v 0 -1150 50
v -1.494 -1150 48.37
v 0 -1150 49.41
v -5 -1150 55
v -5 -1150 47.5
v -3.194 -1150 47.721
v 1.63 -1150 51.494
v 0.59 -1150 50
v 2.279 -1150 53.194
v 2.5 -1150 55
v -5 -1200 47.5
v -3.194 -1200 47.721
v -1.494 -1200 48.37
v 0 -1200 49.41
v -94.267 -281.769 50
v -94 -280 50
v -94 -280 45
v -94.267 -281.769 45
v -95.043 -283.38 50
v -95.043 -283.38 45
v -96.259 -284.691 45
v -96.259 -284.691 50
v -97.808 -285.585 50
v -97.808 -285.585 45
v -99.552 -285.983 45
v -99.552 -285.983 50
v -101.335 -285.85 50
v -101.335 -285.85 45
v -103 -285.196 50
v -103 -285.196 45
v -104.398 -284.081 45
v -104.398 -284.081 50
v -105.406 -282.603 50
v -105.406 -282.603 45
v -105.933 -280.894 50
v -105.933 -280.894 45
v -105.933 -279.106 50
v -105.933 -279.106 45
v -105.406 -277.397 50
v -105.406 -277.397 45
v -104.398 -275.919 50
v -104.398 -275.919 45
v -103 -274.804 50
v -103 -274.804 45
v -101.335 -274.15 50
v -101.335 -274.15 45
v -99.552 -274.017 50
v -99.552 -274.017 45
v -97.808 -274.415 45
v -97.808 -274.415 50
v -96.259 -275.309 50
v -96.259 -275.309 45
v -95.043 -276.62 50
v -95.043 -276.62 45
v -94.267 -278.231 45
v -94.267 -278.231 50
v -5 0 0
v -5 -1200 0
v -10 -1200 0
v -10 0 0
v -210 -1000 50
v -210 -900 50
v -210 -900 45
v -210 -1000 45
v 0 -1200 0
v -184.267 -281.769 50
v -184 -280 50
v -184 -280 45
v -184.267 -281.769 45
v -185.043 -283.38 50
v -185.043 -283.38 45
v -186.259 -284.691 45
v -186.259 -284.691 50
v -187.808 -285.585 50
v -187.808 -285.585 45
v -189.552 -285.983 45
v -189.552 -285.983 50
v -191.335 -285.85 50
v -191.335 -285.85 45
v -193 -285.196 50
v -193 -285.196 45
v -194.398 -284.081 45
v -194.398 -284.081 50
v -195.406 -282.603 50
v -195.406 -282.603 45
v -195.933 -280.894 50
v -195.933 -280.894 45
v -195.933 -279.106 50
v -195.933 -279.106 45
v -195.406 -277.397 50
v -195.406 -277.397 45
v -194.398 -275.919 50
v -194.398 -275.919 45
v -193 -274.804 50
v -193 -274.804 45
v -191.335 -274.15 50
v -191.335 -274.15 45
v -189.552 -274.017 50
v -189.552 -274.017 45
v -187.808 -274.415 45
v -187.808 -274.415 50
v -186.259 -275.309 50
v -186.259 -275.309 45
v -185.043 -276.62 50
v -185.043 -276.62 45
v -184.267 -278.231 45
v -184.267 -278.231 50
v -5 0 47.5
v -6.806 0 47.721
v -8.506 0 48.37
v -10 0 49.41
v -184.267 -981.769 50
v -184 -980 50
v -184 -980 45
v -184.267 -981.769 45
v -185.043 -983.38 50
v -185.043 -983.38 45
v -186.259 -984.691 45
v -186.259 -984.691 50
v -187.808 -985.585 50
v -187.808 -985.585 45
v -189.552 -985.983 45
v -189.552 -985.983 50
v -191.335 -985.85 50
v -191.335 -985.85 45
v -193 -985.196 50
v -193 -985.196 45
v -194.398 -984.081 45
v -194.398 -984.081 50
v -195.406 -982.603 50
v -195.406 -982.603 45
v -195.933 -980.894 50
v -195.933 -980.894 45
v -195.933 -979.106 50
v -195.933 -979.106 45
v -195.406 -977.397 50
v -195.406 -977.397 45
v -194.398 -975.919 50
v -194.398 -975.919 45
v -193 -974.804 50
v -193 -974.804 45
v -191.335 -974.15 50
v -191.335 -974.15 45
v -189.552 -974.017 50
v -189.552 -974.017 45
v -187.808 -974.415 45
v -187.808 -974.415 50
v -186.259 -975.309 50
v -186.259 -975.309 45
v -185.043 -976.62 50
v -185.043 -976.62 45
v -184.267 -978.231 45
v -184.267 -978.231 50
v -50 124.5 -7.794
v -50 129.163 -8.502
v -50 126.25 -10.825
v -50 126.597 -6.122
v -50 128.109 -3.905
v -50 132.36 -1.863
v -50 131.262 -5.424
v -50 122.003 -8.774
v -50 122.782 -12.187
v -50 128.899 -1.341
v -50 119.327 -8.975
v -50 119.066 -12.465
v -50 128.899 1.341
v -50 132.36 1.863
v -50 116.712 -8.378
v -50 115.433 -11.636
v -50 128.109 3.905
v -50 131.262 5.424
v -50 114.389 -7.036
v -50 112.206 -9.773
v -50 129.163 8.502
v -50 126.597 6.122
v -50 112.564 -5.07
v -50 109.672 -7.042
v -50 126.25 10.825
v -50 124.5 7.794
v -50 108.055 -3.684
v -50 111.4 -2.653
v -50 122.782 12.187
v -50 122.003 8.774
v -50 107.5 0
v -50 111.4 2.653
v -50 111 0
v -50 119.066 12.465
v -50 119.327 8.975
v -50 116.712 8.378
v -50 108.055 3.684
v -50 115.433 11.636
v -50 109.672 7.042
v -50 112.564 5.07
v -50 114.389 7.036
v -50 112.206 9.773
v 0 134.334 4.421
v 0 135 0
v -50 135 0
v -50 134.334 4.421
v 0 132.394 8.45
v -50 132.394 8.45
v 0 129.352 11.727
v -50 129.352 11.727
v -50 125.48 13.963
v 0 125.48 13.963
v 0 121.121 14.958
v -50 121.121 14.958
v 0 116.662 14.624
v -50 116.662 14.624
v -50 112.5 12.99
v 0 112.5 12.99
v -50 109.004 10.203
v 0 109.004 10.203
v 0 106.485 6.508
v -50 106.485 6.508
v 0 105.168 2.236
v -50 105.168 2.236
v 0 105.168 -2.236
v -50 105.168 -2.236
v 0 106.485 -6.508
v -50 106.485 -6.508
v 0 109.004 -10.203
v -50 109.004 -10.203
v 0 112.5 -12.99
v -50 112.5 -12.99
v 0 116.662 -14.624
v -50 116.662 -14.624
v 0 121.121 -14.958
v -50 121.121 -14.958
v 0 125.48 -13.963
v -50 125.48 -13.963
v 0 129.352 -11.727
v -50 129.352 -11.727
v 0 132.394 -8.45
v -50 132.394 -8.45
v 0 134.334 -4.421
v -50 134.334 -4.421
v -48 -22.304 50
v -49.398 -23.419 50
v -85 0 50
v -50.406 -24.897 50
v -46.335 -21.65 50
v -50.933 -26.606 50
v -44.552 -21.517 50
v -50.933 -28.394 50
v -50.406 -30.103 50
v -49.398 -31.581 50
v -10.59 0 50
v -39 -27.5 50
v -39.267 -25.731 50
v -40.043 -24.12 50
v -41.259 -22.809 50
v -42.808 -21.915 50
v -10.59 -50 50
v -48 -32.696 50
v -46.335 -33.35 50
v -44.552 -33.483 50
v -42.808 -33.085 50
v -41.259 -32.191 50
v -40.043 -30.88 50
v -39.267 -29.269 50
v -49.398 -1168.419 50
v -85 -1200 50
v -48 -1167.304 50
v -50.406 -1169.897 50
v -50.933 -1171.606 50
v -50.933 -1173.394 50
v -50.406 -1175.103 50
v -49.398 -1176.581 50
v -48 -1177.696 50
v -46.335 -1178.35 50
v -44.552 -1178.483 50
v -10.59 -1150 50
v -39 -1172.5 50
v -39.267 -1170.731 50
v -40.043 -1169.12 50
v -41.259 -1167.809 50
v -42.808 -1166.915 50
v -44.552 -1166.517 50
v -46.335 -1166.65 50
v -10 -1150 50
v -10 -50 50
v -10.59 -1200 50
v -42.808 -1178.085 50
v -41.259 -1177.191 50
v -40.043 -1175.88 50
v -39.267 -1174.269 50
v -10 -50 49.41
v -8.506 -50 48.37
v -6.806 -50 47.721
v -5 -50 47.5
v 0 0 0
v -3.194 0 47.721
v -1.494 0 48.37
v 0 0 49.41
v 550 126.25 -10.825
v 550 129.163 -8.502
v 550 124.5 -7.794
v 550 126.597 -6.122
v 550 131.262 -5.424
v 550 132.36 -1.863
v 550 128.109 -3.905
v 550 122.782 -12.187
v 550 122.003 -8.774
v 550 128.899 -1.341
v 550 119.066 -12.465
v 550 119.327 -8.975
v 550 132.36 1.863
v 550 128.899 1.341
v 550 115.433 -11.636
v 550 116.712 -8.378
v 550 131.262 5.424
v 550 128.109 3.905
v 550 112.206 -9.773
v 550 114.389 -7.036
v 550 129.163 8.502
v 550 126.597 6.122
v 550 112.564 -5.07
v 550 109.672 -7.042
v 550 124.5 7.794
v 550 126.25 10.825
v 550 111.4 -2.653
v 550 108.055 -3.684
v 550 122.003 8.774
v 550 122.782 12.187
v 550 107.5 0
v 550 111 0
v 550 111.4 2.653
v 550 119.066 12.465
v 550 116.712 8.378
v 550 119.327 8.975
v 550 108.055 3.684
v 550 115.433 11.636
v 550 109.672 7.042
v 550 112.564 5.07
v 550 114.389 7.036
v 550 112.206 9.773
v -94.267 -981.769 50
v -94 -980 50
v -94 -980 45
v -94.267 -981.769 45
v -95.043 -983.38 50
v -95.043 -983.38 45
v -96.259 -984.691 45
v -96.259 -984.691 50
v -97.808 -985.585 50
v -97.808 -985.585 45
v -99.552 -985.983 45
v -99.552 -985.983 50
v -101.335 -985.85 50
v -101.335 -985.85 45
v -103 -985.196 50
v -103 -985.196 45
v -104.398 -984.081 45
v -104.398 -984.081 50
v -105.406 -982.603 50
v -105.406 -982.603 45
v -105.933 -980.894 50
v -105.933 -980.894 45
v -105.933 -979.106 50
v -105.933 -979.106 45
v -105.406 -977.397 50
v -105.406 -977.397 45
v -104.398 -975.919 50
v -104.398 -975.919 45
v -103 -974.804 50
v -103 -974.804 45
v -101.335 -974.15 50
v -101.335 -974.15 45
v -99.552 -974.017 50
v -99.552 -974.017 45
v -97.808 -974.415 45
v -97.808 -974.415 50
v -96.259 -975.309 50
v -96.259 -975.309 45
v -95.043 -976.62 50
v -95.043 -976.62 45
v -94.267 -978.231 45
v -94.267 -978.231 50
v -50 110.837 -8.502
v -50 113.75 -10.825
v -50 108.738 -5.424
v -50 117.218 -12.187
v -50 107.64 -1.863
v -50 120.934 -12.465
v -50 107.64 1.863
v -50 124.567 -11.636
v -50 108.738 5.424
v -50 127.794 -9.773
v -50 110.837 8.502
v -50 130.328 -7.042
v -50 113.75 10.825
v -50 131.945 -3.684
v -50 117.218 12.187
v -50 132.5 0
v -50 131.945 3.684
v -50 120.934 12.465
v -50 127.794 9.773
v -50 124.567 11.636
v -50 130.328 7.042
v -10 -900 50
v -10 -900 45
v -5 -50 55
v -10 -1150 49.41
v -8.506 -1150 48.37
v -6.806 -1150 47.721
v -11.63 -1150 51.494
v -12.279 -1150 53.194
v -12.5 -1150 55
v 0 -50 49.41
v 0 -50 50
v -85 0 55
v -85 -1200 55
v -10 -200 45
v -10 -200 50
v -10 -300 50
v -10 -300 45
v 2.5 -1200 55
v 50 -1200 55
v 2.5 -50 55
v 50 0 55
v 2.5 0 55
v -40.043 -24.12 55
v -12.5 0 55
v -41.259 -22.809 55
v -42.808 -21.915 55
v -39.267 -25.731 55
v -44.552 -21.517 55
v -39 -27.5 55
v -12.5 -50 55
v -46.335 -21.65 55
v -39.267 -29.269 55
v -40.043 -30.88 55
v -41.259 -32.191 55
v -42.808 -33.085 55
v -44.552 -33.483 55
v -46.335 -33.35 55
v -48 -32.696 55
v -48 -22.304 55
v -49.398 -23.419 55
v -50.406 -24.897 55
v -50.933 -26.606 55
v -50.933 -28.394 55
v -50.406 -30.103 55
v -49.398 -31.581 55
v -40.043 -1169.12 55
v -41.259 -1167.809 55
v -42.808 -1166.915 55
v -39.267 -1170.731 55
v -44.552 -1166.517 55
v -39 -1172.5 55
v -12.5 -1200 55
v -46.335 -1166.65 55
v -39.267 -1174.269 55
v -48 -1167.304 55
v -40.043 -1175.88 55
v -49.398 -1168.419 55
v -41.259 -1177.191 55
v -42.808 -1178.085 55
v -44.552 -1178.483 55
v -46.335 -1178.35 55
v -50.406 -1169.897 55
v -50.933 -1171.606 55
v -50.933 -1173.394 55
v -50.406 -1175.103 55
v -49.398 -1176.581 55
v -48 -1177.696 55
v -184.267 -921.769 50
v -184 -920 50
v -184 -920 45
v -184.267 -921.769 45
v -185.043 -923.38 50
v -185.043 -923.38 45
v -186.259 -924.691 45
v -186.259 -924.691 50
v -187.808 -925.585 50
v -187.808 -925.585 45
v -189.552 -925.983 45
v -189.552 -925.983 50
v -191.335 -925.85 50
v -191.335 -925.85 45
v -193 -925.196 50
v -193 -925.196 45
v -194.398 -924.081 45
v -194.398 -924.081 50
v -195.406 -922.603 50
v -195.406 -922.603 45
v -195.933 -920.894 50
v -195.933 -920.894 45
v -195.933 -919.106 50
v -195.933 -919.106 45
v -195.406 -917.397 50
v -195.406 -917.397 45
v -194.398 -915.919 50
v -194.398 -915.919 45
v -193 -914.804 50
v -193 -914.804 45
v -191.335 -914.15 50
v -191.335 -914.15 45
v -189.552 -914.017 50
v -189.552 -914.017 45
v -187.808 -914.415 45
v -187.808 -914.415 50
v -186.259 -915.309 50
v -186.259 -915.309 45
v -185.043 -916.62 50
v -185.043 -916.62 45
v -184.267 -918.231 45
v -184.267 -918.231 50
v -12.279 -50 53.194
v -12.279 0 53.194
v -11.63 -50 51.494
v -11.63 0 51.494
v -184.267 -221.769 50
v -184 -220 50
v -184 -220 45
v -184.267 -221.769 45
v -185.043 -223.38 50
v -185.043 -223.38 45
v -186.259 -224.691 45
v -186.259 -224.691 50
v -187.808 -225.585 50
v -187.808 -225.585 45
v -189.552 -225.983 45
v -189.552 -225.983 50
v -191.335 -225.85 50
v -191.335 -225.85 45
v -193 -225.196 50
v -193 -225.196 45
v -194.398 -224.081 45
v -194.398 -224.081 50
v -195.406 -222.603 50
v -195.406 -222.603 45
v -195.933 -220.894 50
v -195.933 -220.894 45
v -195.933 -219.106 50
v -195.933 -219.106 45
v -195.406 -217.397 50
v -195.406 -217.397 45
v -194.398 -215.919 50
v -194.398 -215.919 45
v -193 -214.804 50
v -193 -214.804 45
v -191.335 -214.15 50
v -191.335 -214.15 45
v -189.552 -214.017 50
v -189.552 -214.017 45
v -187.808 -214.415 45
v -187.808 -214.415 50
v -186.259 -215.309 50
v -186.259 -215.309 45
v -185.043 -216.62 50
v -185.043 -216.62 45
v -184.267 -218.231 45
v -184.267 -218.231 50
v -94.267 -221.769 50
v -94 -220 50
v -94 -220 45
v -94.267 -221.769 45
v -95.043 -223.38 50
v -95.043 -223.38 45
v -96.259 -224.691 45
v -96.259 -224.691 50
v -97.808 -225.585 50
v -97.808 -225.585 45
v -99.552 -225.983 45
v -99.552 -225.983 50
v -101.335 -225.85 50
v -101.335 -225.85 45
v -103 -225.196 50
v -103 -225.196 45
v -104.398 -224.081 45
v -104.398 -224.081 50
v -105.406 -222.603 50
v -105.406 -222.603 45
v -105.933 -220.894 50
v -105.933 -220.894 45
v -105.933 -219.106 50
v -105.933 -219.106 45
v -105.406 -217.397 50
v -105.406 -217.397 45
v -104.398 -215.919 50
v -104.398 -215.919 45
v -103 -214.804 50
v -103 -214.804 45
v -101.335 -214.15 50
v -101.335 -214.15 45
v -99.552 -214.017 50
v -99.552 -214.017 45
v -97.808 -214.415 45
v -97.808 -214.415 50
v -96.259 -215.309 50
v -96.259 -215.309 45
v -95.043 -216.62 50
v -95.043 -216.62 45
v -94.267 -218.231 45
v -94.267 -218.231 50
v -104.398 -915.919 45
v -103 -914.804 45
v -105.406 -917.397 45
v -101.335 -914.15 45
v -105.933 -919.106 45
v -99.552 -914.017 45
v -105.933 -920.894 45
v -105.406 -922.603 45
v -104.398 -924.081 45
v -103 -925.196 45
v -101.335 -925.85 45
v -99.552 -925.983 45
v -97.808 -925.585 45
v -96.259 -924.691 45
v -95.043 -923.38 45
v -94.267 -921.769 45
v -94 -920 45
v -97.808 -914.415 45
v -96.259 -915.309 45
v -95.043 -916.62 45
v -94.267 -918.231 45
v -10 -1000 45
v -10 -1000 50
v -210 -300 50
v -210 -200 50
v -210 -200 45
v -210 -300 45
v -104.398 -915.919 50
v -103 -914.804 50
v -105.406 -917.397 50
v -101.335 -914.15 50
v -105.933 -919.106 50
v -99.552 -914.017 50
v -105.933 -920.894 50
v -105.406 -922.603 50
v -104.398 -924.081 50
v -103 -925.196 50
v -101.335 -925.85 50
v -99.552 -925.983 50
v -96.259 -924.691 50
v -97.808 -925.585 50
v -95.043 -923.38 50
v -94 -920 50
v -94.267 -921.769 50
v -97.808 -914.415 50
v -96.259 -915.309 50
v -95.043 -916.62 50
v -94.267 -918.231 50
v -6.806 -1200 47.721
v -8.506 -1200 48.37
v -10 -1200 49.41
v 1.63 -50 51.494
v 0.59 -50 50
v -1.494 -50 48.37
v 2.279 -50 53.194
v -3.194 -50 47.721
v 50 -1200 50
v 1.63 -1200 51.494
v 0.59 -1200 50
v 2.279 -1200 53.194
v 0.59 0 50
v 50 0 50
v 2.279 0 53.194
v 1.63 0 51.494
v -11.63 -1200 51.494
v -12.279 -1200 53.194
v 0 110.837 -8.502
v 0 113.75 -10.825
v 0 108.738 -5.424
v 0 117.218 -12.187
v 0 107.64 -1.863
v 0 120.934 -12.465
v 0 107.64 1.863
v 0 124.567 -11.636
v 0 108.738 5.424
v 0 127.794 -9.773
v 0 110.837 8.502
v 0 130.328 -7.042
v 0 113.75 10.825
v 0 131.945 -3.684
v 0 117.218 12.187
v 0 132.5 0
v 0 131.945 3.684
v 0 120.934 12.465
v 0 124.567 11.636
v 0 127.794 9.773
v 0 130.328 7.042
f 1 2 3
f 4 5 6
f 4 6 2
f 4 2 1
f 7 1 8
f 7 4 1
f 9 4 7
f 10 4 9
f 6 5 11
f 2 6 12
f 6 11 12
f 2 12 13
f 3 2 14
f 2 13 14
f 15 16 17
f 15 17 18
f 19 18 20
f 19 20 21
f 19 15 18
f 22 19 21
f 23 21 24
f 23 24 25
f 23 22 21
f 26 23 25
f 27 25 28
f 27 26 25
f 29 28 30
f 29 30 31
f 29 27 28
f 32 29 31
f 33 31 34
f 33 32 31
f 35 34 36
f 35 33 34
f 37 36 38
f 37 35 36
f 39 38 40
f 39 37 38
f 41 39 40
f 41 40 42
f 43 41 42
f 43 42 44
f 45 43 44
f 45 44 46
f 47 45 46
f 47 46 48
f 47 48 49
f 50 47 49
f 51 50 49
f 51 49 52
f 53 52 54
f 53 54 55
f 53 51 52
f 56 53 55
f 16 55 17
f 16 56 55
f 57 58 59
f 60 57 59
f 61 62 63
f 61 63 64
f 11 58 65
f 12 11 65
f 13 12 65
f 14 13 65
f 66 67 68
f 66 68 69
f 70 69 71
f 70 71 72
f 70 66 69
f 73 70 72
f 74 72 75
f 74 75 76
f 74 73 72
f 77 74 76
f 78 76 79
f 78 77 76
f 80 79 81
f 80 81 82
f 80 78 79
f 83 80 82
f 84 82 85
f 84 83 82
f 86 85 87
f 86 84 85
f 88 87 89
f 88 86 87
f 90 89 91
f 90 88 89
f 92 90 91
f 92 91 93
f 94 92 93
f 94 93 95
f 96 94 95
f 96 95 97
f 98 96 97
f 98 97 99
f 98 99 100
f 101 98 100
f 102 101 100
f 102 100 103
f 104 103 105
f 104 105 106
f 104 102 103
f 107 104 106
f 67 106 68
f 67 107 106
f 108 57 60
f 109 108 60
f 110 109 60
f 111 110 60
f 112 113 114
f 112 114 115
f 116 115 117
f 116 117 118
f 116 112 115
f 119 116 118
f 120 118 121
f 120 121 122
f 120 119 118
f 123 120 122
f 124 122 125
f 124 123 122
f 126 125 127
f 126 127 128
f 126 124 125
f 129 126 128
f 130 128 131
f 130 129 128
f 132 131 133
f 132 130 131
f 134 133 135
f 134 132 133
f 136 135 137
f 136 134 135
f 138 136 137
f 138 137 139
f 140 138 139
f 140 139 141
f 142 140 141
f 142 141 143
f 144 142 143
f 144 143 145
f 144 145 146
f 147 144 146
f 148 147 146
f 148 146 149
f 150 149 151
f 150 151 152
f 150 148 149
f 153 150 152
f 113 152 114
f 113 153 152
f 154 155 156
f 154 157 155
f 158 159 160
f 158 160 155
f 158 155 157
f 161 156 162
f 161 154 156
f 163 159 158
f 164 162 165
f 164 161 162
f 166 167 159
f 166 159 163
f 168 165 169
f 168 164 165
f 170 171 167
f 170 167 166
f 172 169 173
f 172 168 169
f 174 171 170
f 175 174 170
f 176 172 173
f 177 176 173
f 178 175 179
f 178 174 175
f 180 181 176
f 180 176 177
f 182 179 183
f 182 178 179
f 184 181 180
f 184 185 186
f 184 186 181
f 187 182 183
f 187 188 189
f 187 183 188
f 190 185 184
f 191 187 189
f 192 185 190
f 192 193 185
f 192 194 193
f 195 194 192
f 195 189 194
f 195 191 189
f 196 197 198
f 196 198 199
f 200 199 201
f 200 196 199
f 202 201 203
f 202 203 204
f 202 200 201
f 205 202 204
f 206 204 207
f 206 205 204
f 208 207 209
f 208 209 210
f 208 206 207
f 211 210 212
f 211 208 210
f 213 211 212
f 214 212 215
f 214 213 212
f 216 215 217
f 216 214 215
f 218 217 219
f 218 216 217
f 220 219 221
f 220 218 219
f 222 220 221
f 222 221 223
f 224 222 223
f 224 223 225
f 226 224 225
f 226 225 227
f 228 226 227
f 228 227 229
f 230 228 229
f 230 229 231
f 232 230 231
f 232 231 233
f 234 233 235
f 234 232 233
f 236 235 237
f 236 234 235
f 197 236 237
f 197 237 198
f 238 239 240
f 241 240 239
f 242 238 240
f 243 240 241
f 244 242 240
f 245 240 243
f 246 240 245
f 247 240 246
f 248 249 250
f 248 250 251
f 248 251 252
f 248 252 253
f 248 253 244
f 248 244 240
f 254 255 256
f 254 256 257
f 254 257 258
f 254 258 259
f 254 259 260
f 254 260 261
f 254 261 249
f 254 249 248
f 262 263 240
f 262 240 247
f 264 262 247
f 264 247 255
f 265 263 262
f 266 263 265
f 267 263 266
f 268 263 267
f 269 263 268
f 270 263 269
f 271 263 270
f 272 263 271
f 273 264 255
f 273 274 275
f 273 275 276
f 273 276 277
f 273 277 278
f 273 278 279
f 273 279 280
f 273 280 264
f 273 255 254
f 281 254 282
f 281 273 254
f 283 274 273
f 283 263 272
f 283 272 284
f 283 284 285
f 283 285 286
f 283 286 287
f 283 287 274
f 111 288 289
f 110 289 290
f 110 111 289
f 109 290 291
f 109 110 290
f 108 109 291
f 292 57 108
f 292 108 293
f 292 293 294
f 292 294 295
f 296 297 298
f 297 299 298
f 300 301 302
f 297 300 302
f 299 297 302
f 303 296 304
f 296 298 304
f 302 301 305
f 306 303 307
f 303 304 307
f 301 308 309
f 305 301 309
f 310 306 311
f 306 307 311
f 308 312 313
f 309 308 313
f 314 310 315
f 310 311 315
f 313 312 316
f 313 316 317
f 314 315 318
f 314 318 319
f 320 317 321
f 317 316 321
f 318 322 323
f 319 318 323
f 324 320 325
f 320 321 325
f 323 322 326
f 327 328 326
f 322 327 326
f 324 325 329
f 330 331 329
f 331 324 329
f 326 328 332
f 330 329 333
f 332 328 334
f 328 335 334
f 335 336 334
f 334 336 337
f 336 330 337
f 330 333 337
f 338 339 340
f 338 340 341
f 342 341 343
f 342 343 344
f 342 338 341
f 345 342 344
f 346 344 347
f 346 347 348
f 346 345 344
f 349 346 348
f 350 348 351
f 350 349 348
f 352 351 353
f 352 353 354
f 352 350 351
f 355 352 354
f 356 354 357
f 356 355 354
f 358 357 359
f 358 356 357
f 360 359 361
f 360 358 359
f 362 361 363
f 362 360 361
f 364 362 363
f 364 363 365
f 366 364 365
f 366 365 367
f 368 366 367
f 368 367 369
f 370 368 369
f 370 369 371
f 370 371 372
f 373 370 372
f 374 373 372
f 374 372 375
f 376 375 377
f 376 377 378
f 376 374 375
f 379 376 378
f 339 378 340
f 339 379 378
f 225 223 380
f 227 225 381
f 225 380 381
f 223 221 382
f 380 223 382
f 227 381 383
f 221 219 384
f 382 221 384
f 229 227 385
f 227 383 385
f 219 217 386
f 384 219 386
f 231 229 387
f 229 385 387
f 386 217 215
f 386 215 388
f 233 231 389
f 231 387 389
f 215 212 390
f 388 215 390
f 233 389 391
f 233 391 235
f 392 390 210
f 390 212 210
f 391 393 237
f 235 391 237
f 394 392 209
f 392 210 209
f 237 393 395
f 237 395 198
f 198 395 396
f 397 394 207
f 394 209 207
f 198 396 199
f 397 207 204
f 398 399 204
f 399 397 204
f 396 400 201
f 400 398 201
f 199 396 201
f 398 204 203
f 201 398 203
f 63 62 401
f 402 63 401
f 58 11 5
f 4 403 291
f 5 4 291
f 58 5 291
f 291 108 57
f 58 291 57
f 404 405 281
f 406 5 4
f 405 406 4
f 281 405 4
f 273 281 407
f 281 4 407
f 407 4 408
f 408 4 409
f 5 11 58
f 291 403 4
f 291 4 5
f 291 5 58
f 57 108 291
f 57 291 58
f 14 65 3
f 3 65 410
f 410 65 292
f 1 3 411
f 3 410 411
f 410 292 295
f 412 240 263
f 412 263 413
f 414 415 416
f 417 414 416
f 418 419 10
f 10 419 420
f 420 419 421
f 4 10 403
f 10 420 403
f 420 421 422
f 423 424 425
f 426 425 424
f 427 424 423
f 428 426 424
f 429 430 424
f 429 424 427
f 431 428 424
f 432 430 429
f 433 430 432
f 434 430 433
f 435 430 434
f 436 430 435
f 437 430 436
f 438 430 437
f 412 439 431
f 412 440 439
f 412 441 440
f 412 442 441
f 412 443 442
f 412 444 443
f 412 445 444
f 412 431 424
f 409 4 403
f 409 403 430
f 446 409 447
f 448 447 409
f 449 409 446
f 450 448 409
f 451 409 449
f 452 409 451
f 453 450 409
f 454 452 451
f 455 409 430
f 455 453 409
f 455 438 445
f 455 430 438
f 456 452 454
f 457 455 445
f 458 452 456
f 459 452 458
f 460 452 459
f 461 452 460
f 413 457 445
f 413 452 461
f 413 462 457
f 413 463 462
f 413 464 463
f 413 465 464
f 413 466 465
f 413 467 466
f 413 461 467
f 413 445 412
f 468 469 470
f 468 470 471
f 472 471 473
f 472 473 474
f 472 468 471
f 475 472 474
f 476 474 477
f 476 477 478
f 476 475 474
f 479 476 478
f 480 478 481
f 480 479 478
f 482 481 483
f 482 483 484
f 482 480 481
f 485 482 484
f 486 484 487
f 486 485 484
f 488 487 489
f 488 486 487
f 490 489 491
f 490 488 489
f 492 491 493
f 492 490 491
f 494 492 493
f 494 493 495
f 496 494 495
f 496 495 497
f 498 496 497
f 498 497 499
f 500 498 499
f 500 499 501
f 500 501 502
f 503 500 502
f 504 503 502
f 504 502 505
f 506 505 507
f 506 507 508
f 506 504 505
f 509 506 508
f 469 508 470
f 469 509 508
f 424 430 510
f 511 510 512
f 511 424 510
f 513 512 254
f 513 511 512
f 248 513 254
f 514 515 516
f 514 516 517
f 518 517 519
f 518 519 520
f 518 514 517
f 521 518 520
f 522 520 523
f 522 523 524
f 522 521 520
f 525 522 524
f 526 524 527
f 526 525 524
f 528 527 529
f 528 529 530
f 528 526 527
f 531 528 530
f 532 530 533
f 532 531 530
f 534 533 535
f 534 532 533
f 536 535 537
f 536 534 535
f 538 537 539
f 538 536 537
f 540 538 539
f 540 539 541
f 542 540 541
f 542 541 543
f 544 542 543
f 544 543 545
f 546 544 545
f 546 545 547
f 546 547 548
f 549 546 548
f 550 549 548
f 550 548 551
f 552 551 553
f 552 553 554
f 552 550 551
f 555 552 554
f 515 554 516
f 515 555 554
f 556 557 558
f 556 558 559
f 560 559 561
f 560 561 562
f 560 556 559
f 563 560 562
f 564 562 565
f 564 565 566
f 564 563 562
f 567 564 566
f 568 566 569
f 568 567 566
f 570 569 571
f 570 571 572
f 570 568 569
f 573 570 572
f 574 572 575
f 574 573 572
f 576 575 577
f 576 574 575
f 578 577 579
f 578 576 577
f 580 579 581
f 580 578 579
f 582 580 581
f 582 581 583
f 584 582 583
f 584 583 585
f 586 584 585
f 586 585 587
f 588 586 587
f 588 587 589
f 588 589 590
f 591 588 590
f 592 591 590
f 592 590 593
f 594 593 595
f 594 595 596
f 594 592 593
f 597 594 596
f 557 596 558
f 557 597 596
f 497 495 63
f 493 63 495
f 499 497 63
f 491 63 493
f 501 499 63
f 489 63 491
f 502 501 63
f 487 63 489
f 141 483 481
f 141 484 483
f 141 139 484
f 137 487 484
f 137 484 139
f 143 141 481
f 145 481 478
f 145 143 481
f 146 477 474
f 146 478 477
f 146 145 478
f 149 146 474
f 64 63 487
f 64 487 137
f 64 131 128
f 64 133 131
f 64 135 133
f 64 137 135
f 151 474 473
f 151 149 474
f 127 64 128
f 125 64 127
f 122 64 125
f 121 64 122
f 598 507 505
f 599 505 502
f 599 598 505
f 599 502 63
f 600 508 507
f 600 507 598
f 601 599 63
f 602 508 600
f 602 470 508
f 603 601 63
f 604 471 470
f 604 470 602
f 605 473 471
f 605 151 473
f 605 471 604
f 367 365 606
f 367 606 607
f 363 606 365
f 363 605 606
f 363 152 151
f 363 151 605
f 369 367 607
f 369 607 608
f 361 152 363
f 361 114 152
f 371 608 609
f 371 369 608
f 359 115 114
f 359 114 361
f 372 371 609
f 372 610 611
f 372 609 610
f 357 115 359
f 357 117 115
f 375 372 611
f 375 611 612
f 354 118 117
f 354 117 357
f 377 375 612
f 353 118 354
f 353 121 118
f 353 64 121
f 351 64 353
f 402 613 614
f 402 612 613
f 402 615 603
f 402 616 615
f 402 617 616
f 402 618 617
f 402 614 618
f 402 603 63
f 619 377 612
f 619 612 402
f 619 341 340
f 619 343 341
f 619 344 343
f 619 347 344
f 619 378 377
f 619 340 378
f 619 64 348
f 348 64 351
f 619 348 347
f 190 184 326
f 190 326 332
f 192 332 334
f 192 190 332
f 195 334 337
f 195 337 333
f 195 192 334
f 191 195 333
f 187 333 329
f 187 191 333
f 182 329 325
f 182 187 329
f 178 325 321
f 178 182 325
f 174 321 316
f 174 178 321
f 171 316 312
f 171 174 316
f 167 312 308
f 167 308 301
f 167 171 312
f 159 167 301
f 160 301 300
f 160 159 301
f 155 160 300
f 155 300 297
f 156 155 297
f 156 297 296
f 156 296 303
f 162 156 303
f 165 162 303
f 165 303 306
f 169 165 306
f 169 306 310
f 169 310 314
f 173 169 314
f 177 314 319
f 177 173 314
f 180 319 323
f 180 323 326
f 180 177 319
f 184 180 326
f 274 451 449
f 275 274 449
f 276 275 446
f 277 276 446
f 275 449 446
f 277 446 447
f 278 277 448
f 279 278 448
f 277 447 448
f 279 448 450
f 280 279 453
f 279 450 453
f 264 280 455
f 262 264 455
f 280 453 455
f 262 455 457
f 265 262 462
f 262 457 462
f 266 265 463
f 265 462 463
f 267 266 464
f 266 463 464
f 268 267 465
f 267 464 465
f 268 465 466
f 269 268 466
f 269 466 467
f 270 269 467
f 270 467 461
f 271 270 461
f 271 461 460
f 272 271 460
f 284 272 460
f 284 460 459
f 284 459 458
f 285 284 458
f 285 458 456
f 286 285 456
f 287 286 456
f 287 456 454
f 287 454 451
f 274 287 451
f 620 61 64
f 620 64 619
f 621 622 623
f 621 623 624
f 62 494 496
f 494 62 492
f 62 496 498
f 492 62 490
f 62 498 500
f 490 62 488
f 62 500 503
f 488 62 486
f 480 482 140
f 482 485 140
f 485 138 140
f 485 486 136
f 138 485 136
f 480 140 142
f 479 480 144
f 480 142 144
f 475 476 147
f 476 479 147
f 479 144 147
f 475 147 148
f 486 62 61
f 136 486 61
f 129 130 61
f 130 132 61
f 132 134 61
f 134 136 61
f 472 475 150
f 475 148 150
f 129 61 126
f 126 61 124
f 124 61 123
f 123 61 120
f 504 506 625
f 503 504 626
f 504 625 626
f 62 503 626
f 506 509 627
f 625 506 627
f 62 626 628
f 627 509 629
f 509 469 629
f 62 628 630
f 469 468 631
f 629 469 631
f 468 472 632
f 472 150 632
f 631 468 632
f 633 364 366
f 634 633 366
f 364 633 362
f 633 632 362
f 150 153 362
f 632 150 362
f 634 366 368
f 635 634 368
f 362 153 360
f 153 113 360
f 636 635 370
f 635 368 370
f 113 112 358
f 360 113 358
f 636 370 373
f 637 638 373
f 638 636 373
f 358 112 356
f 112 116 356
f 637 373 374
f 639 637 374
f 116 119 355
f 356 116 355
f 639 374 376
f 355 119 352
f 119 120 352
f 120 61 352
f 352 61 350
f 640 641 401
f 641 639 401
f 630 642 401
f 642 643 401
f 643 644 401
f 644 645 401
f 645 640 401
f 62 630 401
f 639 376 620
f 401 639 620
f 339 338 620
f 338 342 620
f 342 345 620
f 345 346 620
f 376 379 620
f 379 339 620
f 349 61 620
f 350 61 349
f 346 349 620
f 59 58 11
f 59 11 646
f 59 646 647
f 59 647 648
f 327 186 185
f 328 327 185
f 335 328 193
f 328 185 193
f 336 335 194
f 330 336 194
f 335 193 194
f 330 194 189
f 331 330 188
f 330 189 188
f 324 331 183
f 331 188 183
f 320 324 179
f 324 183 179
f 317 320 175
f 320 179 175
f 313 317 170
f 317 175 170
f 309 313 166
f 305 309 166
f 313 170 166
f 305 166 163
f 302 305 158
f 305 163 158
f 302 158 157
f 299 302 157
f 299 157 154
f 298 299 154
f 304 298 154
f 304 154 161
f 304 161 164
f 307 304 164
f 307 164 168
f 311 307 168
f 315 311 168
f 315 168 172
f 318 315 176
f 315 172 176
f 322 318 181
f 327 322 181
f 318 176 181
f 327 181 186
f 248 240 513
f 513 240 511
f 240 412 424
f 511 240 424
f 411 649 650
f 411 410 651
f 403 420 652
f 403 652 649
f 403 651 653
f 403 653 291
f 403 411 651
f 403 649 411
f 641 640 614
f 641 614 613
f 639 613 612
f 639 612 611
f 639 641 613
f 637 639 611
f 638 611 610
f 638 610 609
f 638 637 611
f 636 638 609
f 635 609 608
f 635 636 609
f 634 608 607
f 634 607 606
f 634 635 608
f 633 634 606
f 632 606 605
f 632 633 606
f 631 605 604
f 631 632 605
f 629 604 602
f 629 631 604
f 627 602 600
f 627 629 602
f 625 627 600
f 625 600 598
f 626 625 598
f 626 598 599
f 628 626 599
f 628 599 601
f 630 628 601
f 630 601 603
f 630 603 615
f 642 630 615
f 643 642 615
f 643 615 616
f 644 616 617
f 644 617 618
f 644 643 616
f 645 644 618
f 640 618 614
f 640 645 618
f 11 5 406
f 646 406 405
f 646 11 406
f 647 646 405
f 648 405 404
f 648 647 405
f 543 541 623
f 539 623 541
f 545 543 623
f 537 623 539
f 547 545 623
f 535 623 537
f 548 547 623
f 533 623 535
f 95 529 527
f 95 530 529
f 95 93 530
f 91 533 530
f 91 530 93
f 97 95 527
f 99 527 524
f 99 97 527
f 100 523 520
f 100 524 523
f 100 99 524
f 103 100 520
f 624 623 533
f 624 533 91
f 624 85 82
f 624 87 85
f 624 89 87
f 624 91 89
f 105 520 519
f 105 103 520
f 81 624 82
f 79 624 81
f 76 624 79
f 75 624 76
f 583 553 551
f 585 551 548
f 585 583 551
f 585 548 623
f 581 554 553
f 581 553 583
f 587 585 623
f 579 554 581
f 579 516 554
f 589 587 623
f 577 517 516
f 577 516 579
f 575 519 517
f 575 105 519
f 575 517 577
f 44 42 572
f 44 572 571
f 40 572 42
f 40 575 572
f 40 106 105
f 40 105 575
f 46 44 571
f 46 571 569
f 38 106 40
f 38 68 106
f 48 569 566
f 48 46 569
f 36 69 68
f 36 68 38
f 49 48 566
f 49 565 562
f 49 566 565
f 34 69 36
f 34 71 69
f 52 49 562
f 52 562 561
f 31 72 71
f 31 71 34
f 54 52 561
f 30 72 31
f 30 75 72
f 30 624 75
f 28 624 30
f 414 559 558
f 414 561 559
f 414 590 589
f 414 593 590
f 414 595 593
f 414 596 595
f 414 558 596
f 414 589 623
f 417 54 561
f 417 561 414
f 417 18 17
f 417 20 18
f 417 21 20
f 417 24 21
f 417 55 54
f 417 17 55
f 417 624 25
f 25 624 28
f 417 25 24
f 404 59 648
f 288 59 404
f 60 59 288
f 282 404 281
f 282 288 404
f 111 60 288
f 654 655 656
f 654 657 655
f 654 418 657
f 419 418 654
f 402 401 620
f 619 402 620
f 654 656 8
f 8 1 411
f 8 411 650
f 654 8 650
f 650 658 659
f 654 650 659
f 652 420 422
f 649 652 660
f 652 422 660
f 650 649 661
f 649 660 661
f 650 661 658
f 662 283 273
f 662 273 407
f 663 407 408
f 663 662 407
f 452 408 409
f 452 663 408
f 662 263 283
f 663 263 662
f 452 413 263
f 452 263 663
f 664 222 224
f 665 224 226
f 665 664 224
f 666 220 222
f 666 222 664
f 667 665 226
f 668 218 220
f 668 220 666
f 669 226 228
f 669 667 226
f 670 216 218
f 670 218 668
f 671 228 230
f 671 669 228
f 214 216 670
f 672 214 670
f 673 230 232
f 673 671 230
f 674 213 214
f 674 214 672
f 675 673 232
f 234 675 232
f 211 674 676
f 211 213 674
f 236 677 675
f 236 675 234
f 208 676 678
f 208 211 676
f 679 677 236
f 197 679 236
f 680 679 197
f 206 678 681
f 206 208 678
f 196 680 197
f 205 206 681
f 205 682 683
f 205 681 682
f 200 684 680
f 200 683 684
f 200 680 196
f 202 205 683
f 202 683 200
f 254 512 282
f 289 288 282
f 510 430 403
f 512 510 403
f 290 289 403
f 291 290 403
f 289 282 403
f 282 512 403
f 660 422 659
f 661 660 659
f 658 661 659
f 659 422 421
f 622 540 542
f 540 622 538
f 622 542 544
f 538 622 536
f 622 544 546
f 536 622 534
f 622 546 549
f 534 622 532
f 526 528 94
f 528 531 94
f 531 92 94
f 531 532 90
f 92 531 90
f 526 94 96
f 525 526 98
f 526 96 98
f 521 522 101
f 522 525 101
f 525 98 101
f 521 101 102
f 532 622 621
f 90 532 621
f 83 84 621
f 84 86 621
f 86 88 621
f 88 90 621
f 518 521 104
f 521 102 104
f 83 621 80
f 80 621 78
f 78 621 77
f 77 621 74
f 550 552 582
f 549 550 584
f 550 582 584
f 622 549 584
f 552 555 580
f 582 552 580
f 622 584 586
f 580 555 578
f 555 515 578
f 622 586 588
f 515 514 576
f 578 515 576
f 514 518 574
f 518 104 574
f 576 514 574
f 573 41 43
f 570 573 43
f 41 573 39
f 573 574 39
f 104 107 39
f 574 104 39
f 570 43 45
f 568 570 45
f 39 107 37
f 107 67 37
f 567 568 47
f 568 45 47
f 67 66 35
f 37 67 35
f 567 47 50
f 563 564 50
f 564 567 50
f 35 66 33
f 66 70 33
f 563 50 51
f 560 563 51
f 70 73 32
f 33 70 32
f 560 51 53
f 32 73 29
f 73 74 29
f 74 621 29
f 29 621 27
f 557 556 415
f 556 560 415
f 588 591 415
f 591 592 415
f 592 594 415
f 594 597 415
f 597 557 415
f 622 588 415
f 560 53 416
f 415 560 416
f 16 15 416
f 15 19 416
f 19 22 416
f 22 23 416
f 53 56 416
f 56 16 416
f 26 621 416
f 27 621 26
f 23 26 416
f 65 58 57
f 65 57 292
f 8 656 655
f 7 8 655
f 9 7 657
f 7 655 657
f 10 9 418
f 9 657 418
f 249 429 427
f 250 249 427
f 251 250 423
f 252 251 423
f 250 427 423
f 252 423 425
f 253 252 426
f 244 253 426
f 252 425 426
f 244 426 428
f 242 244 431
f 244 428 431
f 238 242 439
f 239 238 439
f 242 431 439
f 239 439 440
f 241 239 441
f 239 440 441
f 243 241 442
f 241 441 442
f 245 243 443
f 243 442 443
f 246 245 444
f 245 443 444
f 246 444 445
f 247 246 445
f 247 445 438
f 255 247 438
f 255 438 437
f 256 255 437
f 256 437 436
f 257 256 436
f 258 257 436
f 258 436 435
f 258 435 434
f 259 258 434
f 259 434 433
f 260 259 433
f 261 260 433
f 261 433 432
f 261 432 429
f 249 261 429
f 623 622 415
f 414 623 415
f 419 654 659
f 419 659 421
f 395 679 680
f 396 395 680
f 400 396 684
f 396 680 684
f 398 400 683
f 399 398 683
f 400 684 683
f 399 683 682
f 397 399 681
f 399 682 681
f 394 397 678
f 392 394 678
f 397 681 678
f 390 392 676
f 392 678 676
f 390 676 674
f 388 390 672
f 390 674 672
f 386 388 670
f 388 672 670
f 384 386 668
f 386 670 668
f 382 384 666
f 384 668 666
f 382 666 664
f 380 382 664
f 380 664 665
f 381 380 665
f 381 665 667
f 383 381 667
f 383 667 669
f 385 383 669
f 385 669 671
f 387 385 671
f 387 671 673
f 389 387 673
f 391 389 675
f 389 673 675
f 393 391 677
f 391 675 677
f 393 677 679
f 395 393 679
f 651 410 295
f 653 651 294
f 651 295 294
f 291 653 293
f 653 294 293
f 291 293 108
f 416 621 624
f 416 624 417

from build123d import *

# Parameters (mm, degrees)
F1_DEPTH  = 1200
F2_R      = 7.5
F3_DEPTH  = 50
F4_R      = 7.5
F5_DEPTH  = 50
F8_R      = 6
F9_DEPTH  = 25
F10_W     = 200
F10_H     = 100
F10_R     = 6
F11_DEPTH = 5
F12_R     = 15
F12_R_2   = 12.5
F13_DEPTH = 50
F14_R     = 12.5
F14_R_2   = 9
F15_DEPTH = 600
F16_W     = 25
F16_H     = 5
F16_W_2   = 1
F17_DEPTH = 1200


with BuildPart() as f1:
    # F0 (on Front) → F1 (new body)
    with BuildSketch(Plane.XZ):
        Polygon((-5, 0), (0, 0), (0, 50), (50, 50), (50, 55), (-5, 55), align=None)
    extrude(amount=F1_DEPTH)

    # F2 (on face) → F3 (cut)
    with BuildSketch(Plane(origin=(0, 0, 0), x_dir=(-1, 0, 0), z_dir=(0, 1, 0))):
        with Locations((5, 55)):
            Circle(F2_R)
    extrude(amount=-F3_DEPTH, mode=Mode.SUBTRACT)

    # F4 (on face) → F5 (cut)
    with BuildSketch(Plane.XZ.offset(1200)):
        with Locations((-5, 55)):
            Circle(F4_R)
    extrude(amount=-F5_DEPTH, mode=Mode.SUBTRACT)


with BuildPart() as f7_1:
    # F7: instance of F1
    add(f1.part.mirror(Plane.YZ.offset(-5)))

    # F8 (on face) → F9 (cut)
    with BuildSketch(Plane.XY.offset(55)):
        with Locations((-45, -27.5)):
            Circle(F8_R)
        with Locations((-45, -1172.5)):
            Circle(F8_R)
    extrude(amount=-F9_DEPTH, mode=Mode.SUBTRACT)

    # F16 (on face) → F17 (join)
    with BuildSketch(Plane.XZ.offset(1200)):
        with Locations((-72.5, 52.5)):
            Rectangle(F16_W, F16_H)
        with Locations((-59.5, 52.5)):
            Rectangle(F16_W_2, F16_H)
    extrude(amount=-F17_DEPTH)


with BuildPart() as f11:
    # F10 (on face) → F11 (new body)
    with BuildSketch(Plane(origin=(0, 0, 50), x_dir=(1, 0, 0), z_dir=(0, 0, -1))):
        with Locations((-110, 250)):
            Rectangle(F10_W, F10_H)
        with Locations((-190, 220)):
            Circle(F10_R, mode=Mode.SUBTRACT)
        with Locations((-190, 280)):
            Circle(F10_R, mode=Mode.SUBTRACT)
        with Locations((-100, 220)):
            Circle(F10_R, mode=Mode.SUBTRACT)
        with Locations((-100, 280)):
            Circle(F10_R, mode=Mode.SUBTRACT)
    extrude(amount=F11_DEPTH)


with BuildPart() as f11b:
    # F10 (on face) → F11, piece 2 (new body)
    with BuildSketch(Plane(origin=(0, 0, 50), x_dir=(1, 0, 0), z_dir=(0, 0, -1))):
        with Locations((-110, 950)):
            Rectangle(F10_W, F10_H)
        with Locations((-190, 920)):
            Circle(F10_R, mode=Mode.SUBTRACT)
        with Locations((-190, 980)):
            Circle(F10_R, mode=Mode.SUBTRACT)
        with Locations((-100, 920)):
            Circle(F10_R, mode=Mode.SUBTRACT)
        with Locations((-100, 980)):
            Circle(F10_R, mode=Mode.SUBTRACT)
    extrude(amount=F11_DEPTH)


with BuildPart() as f13:
    # F12 (on Right) → F13 (new body)
    with BuildSketch(Plane.YZ):
        with Locations((120, 0)):
            Circle(F12_R)
        with Locations((120, 0)):
            Circle(F12_R_2, mode=Mode.SUBTRACT)
    extrude(amount=-F13_DEPTH)


with BuildPart() as f15:
    # F14 (on face) → F15 (new body)
    with BuildSketch(Plane(origin=(-50, 0, 0), x_dir=(0, -1, 0), z_dir=(-1, 0, 0))):
        with Locations((-120, 0)):
            Circle(F14_R)
        with Locations((-120, 0)):
            Circle(F14_R_2, mode=Mode.SUBTRACT)
    extrude(amount=-F15_DEPTH)


solid = Compound([f1.part, f7_1.part, f11.part, f11b.part, f13.part, f15.part])
